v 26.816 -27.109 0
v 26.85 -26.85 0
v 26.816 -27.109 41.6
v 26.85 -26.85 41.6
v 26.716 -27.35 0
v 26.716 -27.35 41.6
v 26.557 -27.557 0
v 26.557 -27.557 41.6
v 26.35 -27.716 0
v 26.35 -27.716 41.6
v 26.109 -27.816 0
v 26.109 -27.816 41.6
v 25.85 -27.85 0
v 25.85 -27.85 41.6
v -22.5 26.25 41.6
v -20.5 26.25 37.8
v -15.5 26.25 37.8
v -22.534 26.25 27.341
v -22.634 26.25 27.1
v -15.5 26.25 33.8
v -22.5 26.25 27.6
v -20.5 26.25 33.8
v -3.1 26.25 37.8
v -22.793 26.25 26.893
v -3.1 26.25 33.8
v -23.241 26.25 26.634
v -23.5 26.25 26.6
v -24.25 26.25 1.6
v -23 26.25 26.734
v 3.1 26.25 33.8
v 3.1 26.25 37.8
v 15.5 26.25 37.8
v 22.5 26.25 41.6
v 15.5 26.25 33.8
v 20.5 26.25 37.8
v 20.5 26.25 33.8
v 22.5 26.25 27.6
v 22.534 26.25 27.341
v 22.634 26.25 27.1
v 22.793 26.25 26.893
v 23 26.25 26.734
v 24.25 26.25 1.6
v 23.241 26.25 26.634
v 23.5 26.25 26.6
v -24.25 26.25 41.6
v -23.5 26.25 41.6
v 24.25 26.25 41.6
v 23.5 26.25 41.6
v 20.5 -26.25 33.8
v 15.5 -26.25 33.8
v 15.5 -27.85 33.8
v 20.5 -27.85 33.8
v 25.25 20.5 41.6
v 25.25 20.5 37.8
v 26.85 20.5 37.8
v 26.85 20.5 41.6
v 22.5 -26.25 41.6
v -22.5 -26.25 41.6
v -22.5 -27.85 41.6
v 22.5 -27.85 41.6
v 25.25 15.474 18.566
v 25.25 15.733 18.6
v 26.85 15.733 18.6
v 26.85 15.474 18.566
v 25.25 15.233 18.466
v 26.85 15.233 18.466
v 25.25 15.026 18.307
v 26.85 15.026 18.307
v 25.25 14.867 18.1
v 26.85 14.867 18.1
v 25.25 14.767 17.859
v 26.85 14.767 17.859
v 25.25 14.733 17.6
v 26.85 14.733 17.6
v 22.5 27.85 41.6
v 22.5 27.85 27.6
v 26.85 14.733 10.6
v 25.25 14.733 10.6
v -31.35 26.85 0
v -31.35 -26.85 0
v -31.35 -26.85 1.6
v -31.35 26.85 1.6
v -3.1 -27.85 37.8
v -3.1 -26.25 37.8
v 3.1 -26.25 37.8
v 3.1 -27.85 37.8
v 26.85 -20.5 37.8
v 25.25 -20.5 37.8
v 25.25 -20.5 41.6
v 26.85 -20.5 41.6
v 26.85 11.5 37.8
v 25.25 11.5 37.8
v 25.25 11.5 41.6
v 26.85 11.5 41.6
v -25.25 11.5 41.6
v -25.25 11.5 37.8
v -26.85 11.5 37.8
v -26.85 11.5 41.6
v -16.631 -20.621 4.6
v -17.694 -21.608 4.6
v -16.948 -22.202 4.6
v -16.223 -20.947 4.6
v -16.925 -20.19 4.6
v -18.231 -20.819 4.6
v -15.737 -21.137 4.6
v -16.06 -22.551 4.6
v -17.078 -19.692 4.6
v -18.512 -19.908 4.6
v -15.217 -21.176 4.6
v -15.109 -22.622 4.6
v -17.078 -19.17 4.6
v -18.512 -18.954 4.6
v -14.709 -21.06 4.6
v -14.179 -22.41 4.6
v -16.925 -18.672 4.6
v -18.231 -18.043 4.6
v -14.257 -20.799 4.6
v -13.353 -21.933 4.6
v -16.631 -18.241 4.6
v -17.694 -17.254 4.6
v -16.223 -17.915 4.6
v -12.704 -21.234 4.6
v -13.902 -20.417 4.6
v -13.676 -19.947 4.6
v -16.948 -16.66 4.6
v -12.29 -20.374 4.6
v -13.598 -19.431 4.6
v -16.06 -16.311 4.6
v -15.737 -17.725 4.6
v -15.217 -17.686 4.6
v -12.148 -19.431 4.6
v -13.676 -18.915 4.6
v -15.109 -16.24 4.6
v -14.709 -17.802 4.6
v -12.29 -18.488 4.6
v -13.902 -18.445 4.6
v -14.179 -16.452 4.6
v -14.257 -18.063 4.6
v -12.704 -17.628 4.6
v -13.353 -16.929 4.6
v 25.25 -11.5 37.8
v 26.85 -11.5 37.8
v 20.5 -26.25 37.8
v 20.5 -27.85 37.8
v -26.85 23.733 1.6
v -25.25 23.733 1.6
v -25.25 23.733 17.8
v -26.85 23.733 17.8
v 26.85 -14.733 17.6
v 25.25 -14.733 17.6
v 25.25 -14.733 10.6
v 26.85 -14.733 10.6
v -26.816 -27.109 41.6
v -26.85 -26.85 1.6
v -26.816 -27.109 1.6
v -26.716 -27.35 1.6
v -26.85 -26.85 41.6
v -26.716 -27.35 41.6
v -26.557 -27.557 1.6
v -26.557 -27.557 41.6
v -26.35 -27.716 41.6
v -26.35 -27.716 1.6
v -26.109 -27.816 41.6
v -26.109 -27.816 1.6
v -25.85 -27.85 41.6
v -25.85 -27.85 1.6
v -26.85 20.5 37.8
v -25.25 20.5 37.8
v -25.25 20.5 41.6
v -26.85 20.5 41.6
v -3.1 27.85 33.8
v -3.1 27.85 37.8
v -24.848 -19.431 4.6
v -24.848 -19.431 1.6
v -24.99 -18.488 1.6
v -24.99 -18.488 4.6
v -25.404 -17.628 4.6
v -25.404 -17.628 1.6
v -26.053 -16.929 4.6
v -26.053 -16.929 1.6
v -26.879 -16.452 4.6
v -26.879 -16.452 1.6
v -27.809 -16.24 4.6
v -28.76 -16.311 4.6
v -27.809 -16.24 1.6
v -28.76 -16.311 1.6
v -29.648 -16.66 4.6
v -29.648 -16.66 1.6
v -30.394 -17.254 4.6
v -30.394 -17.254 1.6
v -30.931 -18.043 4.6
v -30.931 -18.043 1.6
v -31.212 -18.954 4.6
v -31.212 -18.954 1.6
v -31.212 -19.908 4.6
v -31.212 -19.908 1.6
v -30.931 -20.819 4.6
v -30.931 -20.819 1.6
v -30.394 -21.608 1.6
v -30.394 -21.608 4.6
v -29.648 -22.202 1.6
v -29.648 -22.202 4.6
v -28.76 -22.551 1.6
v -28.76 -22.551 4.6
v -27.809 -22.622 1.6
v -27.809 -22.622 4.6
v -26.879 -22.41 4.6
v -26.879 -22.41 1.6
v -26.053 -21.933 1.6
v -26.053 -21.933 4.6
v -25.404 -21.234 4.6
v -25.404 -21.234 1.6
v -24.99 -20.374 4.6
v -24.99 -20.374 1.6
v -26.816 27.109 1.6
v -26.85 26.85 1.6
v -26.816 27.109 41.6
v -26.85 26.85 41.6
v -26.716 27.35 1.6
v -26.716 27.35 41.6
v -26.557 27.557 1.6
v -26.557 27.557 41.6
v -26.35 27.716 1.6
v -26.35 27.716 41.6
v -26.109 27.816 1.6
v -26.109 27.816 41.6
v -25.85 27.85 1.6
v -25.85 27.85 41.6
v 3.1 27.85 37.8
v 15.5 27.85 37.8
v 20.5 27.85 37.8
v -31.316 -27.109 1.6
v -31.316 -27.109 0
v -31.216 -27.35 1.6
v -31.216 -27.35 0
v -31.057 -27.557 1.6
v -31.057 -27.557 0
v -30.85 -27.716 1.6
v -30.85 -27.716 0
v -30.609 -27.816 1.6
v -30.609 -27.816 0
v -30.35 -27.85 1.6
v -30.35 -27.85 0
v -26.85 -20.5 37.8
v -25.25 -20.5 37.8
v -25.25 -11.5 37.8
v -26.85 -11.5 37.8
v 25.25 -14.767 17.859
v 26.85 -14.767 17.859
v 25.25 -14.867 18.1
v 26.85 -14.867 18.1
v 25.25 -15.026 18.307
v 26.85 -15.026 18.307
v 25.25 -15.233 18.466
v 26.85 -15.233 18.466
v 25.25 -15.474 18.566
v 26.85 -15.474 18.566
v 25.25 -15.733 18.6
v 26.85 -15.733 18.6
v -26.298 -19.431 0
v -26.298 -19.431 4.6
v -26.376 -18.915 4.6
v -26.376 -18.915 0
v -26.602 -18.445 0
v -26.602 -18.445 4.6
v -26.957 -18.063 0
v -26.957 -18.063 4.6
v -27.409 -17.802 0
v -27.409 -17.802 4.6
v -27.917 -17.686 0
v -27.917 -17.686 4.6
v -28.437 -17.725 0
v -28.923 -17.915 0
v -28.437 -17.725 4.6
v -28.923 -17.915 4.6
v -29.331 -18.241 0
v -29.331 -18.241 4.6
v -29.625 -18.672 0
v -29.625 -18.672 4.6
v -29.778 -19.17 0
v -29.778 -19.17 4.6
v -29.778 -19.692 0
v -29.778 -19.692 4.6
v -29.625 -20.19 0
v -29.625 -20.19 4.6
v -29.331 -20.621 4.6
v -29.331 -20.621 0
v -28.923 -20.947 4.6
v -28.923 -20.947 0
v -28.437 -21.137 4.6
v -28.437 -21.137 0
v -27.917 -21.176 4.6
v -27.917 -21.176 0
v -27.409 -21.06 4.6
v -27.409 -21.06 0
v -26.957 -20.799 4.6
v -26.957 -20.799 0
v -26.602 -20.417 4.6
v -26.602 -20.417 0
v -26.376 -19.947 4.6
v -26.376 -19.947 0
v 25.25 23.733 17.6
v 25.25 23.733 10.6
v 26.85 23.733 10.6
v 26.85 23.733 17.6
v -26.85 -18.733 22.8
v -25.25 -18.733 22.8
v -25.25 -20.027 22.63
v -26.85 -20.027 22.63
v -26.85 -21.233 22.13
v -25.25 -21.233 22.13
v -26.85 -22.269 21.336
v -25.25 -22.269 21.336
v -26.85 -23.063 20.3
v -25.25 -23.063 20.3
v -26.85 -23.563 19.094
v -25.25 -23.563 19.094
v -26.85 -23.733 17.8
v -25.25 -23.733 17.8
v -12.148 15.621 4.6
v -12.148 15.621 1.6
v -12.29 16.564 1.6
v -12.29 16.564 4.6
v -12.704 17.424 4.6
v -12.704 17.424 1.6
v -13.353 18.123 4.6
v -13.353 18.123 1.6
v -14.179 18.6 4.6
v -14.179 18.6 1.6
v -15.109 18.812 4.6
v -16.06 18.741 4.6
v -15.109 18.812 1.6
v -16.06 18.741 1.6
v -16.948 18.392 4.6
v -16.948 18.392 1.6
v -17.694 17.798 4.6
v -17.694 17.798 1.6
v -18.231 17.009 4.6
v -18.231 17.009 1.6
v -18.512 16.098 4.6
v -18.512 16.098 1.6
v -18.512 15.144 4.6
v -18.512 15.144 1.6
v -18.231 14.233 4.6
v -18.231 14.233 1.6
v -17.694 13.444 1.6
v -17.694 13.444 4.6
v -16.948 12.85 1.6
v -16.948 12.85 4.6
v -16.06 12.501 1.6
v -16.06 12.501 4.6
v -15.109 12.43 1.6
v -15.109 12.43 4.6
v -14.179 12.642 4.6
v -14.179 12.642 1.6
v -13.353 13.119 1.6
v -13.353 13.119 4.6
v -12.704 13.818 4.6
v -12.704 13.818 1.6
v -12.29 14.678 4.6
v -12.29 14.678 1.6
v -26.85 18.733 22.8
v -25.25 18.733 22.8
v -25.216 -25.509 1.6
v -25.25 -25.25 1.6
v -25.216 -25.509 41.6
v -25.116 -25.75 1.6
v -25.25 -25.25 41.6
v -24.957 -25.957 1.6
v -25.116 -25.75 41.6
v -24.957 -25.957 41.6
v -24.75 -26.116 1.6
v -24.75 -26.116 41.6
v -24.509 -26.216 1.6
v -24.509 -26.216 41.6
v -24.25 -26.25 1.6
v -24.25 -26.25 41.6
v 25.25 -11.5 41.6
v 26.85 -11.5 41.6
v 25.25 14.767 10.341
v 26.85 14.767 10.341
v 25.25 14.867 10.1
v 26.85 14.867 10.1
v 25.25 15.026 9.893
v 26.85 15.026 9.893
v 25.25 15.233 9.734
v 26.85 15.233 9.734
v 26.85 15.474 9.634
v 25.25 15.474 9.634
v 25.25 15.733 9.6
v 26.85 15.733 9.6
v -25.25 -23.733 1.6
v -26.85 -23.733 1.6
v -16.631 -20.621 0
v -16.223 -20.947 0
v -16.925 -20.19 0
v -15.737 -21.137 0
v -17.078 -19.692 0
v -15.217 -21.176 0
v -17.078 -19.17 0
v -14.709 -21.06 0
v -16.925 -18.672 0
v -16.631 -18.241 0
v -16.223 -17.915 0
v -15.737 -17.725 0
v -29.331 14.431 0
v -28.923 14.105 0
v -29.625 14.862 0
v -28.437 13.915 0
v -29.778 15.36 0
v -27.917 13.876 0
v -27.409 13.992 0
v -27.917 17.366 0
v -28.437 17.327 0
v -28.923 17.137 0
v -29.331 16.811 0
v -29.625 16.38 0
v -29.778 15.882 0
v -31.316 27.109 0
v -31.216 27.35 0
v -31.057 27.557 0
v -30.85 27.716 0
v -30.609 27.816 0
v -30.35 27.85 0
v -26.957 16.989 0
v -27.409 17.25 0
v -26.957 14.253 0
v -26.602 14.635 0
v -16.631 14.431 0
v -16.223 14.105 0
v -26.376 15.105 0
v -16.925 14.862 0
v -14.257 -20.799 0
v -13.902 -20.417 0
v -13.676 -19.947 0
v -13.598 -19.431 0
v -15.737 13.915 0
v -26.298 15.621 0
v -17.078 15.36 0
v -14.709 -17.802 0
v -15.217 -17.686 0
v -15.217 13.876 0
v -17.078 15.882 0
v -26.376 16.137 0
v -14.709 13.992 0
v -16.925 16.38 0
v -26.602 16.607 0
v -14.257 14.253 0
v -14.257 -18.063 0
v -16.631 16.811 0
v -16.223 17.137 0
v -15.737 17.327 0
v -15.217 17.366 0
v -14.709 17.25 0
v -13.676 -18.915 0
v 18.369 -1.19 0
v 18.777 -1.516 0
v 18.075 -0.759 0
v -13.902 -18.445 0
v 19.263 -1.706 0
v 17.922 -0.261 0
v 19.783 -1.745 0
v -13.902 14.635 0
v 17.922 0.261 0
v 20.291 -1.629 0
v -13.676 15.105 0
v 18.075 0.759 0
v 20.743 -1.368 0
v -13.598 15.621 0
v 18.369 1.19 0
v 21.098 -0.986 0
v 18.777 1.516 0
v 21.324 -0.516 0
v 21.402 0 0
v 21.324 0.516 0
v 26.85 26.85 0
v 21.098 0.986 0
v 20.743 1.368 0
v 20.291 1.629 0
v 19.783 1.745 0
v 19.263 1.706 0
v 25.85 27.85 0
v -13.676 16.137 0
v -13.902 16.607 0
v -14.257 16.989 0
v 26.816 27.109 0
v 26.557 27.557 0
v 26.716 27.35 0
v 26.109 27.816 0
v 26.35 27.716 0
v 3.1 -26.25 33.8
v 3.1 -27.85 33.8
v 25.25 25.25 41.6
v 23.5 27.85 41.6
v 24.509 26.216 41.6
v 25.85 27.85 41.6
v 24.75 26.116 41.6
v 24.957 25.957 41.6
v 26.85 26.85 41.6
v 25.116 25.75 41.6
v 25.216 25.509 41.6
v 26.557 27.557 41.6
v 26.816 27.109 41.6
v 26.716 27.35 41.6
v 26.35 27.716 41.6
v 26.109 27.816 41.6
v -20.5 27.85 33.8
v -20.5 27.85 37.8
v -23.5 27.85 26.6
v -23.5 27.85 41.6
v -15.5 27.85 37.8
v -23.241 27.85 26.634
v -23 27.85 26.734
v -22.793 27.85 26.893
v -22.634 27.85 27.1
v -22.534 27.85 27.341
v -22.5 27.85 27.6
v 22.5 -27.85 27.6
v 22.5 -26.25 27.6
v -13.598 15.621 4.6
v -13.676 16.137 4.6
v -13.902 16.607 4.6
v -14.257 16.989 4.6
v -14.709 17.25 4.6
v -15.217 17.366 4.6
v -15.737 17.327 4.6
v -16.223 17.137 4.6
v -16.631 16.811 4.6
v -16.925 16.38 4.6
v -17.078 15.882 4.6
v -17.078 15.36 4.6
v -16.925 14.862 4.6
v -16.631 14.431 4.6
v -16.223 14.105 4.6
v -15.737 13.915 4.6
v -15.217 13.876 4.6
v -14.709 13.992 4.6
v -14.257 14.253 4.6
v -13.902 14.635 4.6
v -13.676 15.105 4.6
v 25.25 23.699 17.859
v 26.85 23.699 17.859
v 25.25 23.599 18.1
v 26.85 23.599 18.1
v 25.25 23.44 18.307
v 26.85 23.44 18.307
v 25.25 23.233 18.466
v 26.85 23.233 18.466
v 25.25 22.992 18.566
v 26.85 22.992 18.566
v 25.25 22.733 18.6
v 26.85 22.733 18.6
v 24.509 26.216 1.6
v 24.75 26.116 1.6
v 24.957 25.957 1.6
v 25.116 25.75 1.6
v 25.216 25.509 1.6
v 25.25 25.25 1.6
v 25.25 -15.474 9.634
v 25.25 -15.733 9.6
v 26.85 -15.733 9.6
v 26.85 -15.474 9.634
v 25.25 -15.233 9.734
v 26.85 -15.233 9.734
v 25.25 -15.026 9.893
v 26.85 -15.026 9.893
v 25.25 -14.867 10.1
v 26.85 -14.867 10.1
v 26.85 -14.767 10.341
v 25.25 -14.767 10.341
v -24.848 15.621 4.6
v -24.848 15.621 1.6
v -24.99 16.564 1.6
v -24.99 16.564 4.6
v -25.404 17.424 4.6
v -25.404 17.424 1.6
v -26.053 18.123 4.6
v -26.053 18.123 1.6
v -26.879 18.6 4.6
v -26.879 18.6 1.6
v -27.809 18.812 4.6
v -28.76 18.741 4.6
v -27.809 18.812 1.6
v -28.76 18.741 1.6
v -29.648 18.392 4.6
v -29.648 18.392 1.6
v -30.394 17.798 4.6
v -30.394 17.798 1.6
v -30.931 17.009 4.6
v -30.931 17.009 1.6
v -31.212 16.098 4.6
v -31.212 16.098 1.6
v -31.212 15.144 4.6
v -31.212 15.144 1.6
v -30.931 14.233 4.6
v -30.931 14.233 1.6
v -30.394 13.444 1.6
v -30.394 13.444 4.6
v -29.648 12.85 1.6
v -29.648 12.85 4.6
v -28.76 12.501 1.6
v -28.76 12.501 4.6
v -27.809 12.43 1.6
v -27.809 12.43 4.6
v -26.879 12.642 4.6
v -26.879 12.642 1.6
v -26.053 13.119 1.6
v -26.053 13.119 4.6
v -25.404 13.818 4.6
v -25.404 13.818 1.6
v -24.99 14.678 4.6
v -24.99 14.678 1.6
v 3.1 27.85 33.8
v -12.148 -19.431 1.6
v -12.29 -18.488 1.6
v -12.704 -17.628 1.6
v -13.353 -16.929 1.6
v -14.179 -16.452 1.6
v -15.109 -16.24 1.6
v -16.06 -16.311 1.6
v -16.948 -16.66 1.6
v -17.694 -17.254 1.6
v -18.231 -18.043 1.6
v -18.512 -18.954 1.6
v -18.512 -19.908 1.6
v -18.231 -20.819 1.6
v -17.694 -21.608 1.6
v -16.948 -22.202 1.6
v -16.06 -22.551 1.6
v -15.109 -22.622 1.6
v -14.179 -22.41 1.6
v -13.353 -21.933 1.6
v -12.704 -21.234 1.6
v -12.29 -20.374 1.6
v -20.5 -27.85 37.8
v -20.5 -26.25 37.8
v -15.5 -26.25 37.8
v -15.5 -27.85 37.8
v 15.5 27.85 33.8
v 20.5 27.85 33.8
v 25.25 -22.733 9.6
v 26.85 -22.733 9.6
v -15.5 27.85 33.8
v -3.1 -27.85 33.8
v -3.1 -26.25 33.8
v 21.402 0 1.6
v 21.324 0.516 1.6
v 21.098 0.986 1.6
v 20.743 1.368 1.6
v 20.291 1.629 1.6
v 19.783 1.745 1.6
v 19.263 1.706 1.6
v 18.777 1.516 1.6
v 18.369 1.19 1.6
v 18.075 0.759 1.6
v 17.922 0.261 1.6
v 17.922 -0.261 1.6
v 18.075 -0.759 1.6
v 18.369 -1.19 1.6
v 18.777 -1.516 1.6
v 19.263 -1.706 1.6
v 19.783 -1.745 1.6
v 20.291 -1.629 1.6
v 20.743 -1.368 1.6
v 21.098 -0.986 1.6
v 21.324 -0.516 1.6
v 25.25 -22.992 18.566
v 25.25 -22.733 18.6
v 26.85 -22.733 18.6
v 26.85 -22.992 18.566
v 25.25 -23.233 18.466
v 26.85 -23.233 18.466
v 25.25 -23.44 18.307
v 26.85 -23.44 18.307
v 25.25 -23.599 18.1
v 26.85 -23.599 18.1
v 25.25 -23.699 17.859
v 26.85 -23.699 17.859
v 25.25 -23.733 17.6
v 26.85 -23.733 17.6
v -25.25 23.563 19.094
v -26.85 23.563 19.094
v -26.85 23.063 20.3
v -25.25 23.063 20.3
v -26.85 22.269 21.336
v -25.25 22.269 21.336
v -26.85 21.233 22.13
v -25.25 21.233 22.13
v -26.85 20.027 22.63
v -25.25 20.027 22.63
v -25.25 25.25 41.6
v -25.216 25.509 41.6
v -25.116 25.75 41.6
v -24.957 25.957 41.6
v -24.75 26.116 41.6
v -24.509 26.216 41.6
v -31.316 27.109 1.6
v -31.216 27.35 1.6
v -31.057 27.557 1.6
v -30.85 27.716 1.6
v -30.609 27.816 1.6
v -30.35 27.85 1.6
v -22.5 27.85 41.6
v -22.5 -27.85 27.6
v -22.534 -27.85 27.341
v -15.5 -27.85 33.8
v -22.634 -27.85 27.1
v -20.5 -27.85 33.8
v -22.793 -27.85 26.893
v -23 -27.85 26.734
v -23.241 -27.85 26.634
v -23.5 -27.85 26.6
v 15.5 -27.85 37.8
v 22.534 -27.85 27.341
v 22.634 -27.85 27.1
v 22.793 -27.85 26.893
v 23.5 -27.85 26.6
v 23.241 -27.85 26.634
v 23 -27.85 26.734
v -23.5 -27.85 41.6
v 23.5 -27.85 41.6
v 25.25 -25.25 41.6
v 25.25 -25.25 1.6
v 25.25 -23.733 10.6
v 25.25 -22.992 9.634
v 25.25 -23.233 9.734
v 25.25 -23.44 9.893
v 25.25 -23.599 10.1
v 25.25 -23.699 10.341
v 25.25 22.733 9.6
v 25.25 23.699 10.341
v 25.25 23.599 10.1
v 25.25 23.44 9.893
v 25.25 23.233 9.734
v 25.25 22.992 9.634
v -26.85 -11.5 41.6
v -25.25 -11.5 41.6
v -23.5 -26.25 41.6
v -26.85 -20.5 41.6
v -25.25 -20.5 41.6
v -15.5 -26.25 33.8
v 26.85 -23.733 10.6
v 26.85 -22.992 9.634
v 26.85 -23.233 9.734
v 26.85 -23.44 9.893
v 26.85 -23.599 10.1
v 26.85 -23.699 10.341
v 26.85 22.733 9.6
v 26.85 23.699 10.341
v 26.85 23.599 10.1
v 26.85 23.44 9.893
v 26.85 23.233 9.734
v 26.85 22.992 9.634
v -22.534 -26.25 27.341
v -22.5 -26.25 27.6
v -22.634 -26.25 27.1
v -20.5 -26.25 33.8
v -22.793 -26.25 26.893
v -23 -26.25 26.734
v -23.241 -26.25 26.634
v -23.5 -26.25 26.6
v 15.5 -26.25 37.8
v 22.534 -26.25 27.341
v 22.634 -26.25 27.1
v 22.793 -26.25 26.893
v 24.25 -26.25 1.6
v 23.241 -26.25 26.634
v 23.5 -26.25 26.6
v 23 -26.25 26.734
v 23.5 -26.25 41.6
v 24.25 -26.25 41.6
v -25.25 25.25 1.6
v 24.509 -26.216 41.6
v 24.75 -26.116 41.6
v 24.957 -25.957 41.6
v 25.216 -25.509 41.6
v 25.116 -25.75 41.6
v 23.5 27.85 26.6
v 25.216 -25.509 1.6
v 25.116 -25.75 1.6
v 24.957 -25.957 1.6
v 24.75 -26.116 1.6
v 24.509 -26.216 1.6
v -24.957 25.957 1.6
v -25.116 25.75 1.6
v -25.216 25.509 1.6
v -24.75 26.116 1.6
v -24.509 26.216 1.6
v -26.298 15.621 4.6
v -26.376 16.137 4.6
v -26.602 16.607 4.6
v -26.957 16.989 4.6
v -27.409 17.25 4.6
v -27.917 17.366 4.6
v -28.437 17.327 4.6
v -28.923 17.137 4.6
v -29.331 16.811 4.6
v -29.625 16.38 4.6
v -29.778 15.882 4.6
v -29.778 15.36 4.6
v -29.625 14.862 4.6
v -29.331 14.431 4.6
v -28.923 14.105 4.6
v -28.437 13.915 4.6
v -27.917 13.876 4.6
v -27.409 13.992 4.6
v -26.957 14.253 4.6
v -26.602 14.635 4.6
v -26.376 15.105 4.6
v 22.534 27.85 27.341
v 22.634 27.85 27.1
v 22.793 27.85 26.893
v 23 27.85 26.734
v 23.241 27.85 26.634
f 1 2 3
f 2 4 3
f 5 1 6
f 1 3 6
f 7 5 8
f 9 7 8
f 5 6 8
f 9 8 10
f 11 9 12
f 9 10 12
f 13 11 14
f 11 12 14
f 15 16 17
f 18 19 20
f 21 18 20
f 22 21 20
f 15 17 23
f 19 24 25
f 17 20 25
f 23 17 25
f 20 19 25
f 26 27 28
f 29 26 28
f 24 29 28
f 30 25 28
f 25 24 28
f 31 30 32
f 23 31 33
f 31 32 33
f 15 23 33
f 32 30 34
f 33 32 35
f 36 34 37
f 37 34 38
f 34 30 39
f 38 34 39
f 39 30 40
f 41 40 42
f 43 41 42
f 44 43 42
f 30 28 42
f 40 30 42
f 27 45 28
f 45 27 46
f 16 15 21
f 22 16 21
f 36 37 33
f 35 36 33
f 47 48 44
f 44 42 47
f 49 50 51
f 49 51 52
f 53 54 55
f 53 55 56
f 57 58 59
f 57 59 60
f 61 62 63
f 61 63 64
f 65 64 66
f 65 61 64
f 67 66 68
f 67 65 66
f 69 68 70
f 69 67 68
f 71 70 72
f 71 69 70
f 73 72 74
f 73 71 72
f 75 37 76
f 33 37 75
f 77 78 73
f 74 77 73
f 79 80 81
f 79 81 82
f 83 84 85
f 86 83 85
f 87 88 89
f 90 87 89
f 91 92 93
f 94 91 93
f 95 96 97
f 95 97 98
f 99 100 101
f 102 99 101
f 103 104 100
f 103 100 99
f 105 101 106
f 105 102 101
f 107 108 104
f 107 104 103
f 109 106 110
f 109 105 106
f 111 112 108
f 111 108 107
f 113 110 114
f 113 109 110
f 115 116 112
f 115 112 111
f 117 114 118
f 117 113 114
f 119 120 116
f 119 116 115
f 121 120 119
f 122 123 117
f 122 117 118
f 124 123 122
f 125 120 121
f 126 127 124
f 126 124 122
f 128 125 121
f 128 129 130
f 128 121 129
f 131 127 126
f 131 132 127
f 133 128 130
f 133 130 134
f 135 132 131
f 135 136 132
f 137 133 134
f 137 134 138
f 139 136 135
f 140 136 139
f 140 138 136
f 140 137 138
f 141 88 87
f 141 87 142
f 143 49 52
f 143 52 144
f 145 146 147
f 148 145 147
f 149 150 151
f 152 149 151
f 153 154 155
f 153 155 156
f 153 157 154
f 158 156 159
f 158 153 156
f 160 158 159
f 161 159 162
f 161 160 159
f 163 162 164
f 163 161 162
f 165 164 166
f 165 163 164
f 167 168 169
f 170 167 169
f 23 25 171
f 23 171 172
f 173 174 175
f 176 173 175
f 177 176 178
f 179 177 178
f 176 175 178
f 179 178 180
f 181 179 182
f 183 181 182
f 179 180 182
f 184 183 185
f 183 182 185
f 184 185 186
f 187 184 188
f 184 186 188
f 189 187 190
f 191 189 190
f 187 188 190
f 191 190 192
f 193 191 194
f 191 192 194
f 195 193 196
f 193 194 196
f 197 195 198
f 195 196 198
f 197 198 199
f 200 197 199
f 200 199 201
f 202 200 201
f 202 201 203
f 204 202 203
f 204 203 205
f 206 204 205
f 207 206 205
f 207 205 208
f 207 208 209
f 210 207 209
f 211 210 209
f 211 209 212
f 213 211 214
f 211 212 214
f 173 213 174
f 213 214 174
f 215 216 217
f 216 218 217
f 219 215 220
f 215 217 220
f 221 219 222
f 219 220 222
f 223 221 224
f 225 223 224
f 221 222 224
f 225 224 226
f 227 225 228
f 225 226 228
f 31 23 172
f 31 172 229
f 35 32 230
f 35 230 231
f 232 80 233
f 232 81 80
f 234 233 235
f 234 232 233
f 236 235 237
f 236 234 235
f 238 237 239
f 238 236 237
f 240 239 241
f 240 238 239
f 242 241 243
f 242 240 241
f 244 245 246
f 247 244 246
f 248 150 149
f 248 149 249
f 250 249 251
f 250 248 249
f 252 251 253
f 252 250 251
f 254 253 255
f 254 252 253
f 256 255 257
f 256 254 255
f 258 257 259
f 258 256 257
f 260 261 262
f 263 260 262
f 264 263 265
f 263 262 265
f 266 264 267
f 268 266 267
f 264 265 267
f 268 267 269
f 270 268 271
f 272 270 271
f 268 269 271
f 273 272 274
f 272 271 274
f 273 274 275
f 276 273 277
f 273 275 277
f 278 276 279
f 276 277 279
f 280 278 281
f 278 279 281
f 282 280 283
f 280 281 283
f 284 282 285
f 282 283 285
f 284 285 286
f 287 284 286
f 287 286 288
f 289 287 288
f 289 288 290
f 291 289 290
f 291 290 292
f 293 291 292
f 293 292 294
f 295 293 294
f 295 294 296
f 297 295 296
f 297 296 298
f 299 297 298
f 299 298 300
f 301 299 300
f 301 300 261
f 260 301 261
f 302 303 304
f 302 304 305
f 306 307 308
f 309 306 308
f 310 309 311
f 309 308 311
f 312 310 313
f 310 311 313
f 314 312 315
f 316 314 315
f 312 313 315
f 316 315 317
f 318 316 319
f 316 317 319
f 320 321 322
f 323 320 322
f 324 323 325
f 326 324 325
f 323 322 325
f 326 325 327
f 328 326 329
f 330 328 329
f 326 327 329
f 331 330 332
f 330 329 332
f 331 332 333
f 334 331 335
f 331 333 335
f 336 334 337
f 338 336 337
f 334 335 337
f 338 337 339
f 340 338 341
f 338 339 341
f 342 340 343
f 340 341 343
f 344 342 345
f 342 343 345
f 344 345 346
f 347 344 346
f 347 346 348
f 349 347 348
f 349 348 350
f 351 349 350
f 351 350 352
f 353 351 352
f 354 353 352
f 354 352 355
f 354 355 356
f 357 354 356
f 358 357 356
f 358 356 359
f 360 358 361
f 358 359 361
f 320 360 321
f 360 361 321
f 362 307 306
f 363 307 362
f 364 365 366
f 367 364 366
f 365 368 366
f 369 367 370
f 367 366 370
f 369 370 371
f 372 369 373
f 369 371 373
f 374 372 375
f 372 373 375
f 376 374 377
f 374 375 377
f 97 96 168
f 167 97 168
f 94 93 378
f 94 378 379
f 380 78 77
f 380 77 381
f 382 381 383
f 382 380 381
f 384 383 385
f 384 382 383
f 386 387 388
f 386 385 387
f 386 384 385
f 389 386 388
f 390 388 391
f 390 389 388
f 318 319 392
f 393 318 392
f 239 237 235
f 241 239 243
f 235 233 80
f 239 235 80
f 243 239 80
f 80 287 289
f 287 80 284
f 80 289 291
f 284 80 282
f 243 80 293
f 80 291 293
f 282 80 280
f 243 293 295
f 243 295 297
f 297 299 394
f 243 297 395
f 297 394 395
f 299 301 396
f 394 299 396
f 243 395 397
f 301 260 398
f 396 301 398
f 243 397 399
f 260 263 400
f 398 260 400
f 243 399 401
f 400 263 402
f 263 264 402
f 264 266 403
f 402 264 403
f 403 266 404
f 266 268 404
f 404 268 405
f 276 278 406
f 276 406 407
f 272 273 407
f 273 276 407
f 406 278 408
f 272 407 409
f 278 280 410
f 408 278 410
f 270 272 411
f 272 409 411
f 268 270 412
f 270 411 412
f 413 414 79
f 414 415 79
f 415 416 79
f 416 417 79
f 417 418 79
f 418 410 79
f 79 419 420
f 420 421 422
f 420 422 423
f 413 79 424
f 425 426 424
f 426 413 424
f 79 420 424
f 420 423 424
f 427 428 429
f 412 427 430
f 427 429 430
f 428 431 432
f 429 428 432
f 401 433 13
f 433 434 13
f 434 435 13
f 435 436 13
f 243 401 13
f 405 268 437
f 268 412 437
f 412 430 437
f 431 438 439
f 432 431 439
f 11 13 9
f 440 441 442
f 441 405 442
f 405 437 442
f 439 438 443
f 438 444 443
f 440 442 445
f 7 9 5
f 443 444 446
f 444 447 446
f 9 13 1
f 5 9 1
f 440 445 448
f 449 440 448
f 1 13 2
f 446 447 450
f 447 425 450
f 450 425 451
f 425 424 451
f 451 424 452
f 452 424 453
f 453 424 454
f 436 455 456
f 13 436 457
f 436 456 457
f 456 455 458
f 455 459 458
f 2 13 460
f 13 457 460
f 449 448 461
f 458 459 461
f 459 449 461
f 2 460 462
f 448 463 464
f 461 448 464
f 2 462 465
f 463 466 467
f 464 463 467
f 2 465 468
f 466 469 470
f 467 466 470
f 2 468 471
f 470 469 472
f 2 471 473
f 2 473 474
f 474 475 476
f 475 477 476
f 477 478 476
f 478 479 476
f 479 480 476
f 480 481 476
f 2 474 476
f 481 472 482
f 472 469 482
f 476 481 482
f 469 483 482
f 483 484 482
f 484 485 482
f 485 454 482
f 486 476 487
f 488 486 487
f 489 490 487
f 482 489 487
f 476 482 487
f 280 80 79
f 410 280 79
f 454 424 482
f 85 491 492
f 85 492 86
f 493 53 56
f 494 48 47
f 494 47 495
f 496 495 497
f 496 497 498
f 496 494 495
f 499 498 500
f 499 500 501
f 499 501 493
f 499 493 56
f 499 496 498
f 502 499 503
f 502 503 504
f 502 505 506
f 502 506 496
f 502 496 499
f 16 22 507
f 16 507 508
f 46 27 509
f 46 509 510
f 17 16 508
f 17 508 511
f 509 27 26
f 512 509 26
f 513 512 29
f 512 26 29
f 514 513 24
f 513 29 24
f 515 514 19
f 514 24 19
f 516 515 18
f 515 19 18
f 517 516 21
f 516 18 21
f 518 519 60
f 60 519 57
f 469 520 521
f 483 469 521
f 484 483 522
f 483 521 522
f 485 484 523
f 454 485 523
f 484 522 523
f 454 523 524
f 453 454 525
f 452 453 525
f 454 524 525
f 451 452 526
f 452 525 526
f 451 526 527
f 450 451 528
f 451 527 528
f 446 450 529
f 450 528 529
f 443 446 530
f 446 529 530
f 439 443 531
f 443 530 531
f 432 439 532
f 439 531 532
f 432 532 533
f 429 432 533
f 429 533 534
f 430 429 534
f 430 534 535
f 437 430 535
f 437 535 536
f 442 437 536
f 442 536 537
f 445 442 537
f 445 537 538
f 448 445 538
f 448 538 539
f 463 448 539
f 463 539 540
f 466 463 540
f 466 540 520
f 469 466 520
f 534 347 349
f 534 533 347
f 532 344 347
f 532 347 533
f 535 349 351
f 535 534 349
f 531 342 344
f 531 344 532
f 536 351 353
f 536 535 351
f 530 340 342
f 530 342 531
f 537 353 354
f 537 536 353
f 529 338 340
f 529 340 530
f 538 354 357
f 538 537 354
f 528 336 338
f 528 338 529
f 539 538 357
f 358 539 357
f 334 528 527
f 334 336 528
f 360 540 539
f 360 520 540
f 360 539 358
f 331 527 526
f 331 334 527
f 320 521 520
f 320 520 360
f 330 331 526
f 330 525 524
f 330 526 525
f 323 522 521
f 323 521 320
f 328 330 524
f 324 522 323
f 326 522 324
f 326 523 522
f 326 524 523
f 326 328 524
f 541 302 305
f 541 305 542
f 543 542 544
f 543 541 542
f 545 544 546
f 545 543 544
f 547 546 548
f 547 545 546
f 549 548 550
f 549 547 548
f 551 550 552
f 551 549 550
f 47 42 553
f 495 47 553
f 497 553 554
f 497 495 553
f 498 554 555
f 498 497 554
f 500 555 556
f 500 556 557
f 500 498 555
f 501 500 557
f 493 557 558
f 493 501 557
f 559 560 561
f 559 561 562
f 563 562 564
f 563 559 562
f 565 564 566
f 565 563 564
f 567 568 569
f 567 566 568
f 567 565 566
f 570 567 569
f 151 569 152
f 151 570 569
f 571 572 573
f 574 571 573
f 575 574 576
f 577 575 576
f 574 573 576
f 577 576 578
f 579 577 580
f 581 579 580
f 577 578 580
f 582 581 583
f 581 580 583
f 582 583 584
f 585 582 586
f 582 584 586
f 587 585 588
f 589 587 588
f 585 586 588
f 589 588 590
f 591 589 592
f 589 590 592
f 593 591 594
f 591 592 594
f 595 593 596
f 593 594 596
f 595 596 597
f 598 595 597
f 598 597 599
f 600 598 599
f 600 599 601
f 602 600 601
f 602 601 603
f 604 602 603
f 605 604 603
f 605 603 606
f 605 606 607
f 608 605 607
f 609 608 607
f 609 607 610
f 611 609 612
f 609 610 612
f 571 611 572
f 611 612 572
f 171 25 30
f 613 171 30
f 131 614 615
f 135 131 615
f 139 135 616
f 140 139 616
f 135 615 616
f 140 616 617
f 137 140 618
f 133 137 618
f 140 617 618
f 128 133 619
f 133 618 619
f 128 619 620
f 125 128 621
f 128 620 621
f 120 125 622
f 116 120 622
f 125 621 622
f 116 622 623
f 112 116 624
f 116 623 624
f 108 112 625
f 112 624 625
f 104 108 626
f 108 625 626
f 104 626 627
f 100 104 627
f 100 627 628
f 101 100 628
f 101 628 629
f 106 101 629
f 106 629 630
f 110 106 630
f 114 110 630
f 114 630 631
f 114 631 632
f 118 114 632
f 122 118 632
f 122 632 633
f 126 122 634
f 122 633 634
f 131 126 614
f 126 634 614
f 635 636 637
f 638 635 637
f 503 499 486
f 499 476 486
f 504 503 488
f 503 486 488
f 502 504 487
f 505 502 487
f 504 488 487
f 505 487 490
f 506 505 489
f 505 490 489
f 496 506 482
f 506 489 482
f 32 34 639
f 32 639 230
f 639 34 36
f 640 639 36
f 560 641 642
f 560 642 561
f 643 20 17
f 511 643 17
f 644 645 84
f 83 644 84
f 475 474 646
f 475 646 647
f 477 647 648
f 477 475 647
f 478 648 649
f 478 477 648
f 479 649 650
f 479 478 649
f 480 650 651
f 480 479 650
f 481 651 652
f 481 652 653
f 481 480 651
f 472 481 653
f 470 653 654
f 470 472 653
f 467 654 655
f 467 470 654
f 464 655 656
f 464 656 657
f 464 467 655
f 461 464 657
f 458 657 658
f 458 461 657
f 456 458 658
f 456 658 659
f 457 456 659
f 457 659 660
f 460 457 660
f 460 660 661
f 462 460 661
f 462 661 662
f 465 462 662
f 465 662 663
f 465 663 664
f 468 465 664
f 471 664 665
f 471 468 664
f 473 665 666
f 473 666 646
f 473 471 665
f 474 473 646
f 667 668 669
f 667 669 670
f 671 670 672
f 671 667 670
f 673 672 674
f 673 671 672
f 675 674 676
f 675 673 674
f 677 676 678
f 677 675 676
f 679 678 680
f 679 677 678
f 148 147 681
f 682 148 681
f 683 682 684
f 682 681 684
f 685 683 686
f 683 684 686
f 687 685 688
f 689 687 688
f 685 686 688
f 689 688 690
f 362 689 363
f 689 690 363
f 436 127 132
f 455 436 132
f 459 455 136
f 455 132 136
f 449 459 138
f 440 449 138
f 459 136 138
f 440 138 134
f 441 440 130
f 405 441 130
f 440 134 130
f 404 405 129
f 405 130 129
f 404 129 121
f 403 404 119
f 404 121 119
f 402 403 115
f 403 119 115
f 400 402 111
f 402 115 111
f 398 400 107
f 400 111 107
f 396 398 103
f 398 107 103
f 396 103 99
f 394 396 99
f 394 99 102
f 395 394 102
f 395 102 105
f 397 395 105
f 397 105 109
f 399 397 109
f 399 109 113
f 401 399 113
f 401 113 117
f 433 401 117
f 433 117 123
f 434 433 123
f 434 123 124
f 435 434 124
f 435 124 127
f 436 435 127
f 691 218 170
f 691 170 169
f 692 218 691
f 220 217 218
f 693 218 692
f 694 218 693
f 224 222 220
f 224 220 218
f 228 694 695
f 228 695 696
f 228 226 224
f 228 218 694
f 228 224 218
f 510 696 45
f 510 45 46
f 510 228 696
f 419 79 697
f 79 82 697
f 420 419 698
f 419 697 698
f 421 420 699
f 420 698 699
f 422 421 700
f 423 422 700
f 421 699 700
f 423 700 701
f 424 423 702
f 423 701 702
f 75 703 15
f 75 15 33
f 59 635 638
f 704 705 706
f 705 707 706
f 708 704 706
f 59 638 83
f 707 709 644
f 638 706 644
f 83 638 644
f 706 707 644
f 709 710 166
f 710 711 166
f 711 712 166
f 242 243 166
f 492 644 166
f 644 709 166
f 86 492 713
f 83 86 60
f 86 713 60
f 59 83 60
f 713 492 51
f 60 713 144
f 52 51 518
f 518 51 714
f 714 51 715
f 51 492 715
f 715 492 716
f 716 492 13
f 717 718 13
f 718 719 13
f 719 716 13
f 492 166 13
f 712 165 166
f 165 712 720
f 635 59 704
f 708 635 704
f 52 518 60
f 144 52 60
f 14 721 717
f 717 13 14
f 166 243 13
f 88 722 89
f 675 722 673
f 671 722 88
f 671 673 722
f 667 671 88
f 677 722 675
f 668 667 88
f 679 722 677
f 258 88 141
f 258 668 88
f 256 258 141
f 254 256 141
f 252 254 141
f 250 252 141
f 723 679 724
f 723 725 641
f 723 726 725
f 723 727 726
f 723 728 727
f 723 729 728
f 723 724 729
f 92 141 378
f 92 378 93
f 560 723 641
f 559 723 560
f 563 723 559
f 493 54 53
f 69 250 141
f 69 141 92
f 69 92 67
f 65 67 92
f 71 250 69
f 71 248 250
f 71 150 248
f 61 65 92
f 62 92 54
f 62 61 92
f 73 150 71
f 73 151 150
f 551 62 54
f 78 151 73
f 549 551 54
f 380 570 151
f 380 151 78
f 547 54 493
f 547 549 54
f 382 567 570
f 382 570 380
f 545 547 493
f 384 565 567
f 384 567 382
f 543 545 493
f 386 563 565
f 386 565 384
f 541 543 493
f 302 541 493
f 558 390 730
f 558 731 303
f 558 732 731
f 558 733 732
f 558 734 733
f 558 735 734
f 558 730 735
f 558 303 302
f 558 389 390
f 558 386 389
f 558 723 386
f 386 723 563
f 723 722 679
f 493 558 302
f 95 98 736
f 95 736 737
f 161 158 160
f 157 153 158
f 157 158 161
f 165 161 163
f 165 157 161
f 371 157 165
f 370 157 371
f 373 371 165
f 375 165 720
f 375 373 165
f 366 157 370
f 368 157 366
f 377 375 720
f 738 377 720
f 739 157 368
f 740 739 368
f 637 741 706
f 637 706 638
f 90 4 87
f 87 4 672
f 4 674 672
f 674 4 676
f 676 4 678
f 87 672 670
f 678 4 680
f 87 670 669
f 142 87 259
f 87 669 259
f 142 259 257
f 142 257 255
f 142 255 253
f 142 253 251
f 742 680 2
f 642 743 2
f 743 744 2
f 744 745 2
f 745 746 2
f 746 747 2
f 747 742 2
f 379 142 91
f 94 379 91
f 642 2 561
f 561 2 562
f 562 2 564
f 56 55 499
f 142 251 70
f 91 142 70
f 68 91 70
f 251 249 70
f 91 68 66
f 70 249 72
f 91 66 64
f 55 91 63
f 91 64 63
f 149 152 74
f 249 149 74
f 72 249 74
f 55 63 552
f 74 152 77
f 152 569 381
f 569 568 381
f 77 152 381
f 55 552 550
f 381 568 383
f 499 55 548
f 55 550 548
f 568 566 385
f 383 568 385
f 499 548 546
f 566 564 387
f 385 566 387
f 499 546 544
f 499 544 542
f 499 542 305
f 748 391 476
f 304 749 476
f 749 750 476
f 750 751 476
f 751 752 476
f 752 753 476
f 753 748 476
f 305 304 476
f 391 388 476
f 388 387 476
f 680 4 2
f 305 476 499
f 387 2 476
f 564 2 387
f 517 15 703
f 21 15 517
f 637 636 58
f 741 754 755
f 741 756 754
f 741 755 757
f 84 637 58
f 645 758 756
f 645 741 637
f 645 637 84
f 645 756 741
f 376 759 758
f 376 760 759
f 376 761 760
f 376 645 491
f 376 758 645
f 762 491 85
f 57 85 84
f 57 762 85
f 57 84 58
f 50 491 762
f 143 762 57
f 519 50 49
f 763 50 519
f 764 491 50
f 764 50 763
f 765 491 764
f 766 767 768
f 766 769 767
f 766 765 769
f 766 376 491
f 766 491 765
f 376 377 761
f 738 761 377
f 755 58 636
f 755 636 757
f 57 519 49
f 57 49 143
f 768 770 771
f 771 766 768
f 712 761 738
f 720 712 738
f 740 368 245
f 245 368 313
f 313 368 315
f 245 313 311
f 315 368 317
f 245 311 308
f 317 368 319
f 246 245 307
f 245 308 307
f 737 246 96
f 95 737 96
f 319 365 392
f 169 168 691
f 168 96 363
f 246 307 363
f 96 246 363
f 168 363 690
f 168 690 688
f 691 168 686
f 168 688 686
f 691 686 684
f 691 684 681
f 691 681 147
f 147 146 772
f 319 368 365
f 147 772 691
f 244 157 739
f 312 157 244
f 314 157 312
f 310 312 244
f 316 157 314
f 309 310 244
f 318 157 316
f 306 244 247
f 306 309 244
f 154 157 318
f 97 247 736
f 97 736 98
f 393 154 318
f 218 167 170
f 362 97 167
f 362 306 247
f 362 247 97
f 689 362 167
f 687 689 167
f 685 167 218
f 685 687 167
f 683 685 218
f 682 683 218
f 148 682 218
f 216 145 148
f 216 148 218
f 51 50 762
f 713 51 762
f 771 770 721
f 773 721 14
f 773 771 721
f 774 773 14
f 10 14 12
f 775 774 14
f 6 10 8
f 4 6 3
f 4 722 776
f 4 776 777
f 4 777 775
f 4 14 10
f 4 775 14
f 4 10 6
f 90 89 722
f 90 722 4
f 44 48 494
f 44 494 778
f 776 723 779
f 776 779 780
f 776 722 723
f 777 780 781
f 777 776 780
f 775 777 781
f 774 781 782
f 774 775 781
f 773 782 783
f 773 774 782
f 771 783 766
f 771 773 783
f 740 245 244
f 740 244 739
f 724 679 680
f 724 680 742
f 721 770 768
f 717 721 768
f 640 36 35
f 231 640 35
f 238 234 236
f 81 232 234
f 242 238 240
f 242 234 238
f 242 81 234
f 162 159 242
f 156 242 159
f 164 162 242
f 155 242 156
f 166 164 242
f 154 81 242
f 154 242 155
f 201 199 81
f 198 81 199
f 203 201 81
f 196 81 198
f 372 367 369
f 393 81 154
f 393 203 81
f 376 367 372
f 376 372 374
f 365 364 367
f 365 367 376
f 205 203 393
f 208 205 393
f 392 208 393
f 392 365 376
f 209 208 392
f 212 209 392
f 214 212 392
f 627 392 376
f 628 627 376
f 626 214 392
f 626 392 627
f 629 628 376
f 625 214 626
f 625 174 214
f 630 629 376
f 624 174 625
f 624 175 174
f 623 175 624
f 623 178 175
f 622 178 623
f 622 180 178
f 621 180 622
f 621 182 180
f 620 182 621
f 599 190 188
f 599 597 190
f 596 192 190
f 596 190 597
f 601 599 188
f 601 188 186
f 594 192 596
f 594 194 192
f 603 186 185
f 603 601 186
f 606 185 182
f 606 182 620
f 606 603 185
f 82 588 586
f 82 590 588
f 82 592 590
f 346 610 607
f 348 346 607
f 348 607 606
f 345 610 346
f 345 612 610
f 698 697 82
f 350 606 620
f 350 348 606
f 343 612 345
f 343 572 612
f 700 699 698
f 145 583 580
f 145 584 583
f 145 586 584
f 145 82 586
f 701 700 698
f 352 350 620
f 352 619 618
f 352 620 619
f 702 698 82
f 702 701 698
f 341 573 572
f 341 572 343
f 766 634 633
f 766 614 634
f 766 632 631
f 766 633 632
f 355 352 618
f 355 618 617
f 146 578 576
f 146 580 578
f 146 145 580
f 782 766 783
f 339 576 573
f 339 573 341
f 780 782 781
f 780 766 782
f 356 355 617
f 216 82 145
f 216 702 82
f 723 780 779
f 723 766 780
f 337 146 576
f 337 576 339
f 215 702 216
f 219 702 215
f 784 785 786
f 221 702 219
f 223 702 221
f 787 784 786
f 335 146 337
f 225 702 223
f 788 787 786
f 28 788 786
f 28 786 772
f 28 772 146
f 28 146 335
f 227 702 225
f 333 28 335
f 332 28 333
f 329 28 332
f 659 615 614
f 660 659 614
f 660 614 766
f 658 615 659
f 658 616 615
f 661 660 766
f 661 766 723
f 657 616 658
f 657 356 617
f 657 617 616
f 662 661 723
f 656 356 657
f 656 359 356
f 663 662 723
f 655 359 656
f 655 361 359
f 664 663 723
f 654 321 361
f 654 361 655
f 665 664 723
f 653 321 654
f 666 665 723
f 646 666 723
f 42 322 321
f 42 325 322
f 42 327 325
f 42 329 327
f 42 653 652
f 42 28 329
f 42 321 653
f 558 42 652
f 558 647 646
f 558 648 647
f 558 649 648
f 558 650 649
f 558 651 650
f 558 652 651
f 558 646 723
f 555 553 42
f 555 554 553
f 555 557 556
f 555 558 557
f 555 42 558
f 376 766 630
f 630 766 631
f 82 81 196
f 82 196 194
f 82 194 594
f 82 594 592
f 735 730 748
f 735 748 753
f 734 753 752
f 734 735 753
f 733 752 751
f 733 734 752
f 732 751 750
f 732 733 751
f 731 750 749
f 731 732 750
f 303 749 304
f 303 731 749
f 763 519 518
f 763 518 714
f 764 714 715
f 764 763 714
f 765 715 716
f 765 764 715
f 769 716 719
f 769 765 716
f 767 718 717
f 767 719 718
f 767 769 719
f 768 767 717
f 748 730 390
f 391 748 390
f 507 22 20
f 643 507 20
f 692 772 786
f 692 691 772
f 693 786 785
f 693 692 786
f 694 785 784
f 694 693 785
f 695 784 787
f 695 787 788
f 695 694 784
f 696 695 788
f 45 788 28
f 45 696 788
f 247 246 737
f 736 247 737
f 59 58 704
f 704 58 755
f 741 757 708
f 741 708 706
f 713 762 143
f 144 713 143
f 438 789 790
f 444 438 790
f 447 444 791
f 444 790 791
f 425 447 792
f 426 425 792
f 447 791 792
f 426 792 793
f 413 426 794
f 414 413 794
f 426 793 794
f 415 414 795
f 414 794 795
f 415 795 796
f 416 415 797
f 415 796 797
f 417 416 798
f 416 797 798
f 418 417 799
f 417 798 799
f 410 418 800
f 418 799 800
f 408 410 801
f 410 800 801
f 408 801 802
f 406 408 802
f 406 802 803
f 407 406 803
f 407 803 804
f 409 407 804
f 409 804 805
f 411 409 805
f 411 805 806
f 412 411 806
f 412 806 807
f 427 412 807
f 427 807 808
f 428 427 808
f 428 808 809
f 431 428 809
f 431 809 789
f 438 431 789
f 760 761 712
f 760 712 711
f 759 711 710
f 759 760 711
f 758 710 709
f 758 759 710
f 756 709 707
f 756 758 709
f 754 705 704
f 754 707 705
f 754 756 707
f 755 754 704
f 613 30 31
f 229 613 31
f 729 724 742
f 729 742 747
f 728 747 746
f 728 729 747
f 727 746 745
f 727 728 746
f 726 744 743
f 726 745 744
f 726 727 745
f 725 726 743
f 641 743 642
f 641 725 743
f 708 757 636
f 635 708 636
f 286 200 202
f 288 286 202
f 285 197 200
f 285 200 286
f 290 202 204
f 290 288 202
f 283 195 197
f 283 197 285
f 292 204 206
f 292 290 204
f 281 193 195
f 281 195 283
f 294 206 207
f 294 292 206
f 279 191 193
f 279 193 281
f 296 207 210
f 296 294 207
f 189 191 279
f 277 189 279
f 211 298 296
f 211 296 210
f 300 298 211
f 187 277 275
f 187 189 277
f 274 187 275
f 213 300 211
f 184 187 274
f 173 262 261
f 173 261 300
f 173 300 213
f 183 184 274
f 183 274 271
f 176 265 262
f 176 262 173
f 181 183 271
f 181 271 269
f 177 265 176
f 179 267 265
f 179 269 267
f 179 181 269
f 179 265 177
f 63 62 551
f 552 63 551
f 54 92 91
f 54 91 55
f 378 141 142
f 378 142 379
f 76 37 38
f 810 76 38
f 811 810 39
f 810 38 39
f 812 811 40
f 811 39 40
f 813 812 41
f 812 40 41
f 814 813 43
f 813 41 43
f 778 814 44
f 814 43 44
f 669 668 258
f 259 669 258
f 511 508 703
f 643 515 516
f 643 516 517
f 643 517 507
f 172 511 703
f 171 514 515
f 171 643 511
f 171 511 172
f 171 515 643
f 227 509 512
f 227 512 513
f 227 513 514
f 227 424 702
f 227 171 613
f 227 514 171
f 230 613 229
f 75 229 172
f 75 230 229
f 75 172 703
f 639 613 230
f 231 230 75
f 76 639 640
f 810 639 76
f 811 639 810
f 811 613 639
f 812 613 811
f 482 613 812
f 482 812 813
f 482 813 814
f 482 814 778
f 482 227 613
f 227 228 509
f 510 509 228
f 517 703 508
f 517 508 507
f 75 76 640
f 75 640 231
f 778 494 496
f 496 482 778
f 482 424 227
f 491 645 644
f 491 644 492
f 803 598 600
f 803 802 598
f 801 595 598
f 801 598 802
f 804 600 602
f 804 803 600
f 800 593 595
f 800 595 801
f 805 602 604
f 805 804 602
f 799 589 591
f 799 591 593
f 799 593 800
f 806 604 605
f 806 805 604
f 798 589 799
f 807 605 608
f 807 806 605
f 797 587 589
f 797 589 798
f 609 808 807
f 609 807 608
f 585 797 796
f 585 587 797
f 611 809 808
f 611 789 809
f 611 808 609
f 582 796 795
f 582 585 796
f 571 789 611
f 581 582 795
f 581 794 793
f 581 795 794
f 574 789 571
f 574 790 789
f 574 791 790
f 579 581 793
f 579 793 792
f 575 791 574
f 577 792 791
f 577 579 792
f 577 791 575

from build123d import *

# Parameters (mm, degrees)
SKETCH021_W          = 58.2
SKETCH021_H          = 55.7
SKETCH021_R          = 1.75
PAD007_DEPTH         = 1.6
SKETCH028_W          = 53.7
SKETCH028_H          = 55.7
SKETCH028_W_2        = 50.5
SKETCH028_H_2        = 52.5
PAD008_DEPTH         = 40
FILLET003_R          = 1
SKETCH026_W          = 6.2
SKETCH026_H          = 4
SKETCH026_W_2        = 5
POCKET005_DEPTH      = 27.851
POCKET005_DEPTH_BACK = 27.851
SKETCH023_W          = 9
SKETCH023_H          = 3.8
POCKET006_DEPTH      = 31.351
SKETCH062_W          = 9
SKETCH062_H          = 3.8
POCKET021_DEPTH      = 26.851
SKETCH024_R          = 3.2
PAD006_DEPTH         = 3
SKETCH038_R          = 1.75
POCKET010_DEPTH      = 4.601


with BuildPart() as part:
    # Sketch021 → Pad007 (new body)
    with BuildSketch(Plane.XY):
        with Locations((-2.25, 0)):
            Rectangle(SKETCH021_W, SKETCH021_H)
        with Locations((19.652, 0)):
            Circle(SKETCH021_R, mode=Mode.SUBTRACT)
    extrude(amount=PAD007_DEPTH)

    # Sketch028 → Pad008 (join)
    with BuildSketch(Plane.XY.offset(1.6)):
        Rectangle(SKETCH028_W, SKETCH028_H)
        Rectangle(SKETCH028_W_2, SKETCH028_H_2, mode=Mode.SUBTRACT)
    extrude(amount=PAD008_DEPTH)

    # Fillet003
    fillet003_edges = [part.edges().sort_by_distance(p)[0] for p in [
        (-31.35, -27.85, 0.8),
        (-26.85, 27.85, 21.6),
        (-25.25, 26.25, 21.6),
        (26.85, 27.85, 20.8),
        (25.25, 26.25, 21.6),
        (26.85, -27.85, 20.8),
        (25.25, -26.25, 21.6),
        (-26.85, -27.85, 21.6),
        (-25.25, -26.25, 21.6),
        (-31.35, 27.85, 0.8),
    ]]
    fillet(fillet003_edges, radius=FILLET003_R)

    # Sketch026 → Pocket005 (cut, two sides)
    with BuildSketch(Plane.XZ) as pocket005_sk:
        with Locations((0, 35.8)):
            Rectangle(SKETCH026_W, SKETCH026_H)
        with Locations((-18, 35.8)):
            Rectangle(SKETCH026_W_2, SKETCH026_H)
        with Locations((18, 35.8)):
            Rectangle(SKETCH026_W_2, SKETCH026_H)
        with BuildLine():
            Line((22.5, 41.6), (23.5, 41.6))
            Line((23.5, 41.6), (23.5, 26.6))
            ThreePointArc((22.5, 27.6), (22.792893, 26.892893), (23.5, 26.6))
            Line((22.5, 27.6), (22.5, 41.6))
        make_face()
        with BuildLine():
            Line((-23.5, 41.6), (-22.5, 41.6))
            Line((-22.5, 41.6), (-22.5, 27.6))
            ThreePointArc((-23.5, 26.6), (-22.792893, 26.892893), (-22.5, 27.6))
            Line((-23.5, 26.6), (-23.5, 41.6))
        make_face()
    extrude(amount=-POCKET005_DEPTH, mode=Mode.SUBTRACT)
    extrude(pocket005_sk.sketch, amount=POCKET005_DEPTH_BACK, mode=Mode.SUBTRACT)

    # Sketch023 → Pocket006 (cut, through all)
    with BuildSketch(Plane.YZ):
        with Locations((-16, 39.7)):
            Rectangle(SKETCH023_W, SKETCH023_H)
        with Locations((16, 39.7)):
            Rectangle(SKETCH023_W, SKETCH023_H)
        with BuildLine():
            Line((-18.733, 22.8), (18.733, 22.8))
            ThreePointArc((23.733, 17.8), (22.268534, 21.335534), (18.733, 22.8))
            Line((23.733, 1.6), (23.733, 17.8))
            Line((-23.733, 1.6), (23.733, 1.6))
            Line((-23.733, 17.8), (-23.733, 1.6))
            ThreePointArc((-18.733, 22.8), (-22.268534, 21.335534), (-23.733, 17.8))
        make_face()
    extrude(amount=-POCKET006_DEPTH, mode=Mode.SUBTRACT)

    # Sketch062 → Pocket021 (cut, through all)
    with BuildSketch(Plane.YZ):
        with Locations((-16, 39.7)):
            Rectangle(SKETCH062_W, SKETCH062_H)
        with Locations((16, 39.7)):
            Rectangle(SKETCH062_W, SKETCH062_H)
        with BuildLine():
            Line((-23.733, 17.6), (-23.733, 10.6))
            ThreePointArc((-23.733, 10.6), (-23.440107, 9.892893), (-22.733, 9.6))
            Line((-22.733, 9.6), (-15.733, 9.6))
            ThreePointArc((-15.733, 9.6), (-15.025893, 9.892893), (-14.733, 10.6))
            Line((-14.733, 17.6), (-14.733, 10.6))
            ThreePointArc((-14.733, 17.6), (-15.025893, 18.307107), (-15.733, 18.6))
            Line((-22.733, 18.6), (-15.733, 18.6))
            ThreePointArc((-22.733, 18.6), (-23.440107, 18.307107), (-23.733, 17.6))
        make_face()
        with BuildLine():
            Line((22.733, 9.6), (15.733, 9.6))
            ThreePointArc((14.733, 10.6), (15.025893, 9.892893), (15.733, 9.6))
            Line((14.733, 10.6), (14.733, 17.6))
            ThreePointArc((15.733, 18.6), (15.025893, 18.307107), (14.733, 17.6))
            Line((15.733, 18.6), (22.733, 18.6))
            ThreePointArc((23.733, 17.6), (23.440107, 18.307107), (22.733, 18.6))
            Line((23.733, 10.6), (23.733, 17.6))
            ThreePointArc((22.733, 9.6), (23.440107, 9.892893), (23.733, 10.6))
        make_face()
    extrude(amount=POCKET021_DEPTH, mode=Mode.SUBTRACT)

    # Sketch024 → Pad006 (join)
    with BuildSketch(Plane.XY.offset(1.6)):
        with Locations((-15.348, 15.621)):
            Circle(SKETCH024_R)
        with Locations((-28.048, -19.431)):
            Circle(SKETCH024_R)
        with Locations((-15.348, -19.431)):
            Circle(SKETCH024_R)
        with Locations((-28.048, 15.621)):
            Circle(SKETCH024_R)
    extrude(amount=PAD006_DEPTH)

    # Sketch038 → Pocket010 (cut, through all)
    with BuildSketch(Plane.XY.offset(4.6)):
        with Locations((-28.048, 15.621)):
            Circle(SKETCH038_R)
        with Locations((-15.348, 15.621)):
            Circle(SKETCH038_R)
        with Locations((-15.348, -19.431)):
            Circle(SKETCH038_R)
        with Locations((-28.048, -19.431)):
            Circle(SKETCH038_R)
    extrude(amount=-POCKET010_DEPTH, mode=Mode.SUBTRACT)


solid = part.part
